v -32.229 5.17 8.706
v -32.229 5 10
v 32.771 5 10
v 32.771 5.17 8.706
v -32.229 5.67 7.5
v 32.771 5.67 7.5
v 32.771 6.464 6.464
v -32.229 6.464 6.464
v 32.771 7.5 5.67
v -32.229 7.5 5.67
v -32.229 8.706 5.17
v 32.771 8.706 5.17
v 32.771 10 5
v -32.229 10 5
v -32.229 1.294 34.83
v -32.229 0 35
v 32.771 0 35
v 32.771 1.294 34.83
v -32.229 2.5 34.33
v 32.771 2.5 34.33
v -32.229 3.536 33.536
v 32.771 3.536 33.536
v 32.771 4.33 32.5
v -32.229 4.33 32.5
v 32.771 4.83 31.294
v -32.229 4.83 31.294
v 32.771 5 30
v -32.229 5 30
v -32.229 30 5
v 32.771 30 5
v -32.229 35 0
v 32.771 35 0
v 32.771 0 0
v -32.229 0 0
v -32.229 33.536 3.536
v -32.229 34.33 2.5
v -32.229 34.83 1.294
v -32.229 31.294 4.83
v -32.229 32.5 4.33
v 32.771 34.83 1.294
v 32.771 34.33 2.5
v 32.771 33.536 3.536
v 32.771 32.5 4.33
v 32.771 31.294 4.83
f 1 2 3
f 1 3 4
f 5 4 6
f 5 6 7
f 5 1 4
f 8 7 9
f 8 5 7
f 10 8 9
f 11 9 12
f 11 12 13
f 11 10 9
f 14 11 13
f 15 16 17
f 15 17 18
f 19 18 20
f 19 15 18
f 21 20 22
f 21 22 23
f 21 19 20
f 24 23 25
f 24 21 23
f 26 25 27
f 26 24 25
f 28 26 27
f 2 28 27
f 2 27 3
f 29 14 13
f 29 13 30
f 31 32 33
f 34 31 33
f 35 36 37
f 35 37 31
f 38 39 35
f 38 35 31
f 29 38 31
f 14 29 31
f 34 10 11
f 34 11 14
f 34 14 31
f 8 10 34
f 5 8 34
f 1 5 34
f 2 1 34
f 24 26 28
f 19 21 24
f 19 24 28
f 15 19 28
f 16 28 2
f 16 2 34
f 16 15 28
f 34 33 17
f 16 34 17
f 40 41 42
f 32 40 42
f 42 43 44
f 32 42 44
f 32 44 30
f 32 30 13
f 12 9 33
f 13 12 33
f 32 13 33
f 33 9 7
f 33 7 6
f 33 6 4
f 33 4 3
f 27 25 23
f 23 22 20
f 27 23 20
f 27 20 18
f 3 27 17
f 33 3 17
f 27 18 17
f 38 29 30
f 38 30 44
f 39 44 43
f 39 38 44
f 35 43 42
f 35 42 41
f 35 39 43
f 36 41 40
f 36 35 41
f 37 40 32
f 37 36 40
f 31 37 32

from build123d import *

# Parameters (mm, degrees)
ANGLE_IRON_35_X_35_X_5_1_DEPTH = 65


with BuildPart() as part:
    # Sketch11 → Angle iron 35 X 35 X 5(1) (new body)
    with BuildSketch(Plane.YZ.offset(-32.229166667)):
        with BuildLine():
            Line((0, 0), (0, 35))
            ThreePointArc((0, 35), (3.535533906, 33.535533906), (5, 30))
            Line((5, 30), (5, 10))
            ThreePointArc((5, 10), (6.464466094, 6.464466094), (10, 5))
            Line((10, 5), (30, 5))
            ThreePointArc((30, 5), (33.535533906, 3.535533906), (35, 0))
            Line((35, 0), (0, 0))
        make_face()
    extrude(amount=ANGLE_IRON_35_X_35_X_5_1_DEPTH)


solid = part.part
